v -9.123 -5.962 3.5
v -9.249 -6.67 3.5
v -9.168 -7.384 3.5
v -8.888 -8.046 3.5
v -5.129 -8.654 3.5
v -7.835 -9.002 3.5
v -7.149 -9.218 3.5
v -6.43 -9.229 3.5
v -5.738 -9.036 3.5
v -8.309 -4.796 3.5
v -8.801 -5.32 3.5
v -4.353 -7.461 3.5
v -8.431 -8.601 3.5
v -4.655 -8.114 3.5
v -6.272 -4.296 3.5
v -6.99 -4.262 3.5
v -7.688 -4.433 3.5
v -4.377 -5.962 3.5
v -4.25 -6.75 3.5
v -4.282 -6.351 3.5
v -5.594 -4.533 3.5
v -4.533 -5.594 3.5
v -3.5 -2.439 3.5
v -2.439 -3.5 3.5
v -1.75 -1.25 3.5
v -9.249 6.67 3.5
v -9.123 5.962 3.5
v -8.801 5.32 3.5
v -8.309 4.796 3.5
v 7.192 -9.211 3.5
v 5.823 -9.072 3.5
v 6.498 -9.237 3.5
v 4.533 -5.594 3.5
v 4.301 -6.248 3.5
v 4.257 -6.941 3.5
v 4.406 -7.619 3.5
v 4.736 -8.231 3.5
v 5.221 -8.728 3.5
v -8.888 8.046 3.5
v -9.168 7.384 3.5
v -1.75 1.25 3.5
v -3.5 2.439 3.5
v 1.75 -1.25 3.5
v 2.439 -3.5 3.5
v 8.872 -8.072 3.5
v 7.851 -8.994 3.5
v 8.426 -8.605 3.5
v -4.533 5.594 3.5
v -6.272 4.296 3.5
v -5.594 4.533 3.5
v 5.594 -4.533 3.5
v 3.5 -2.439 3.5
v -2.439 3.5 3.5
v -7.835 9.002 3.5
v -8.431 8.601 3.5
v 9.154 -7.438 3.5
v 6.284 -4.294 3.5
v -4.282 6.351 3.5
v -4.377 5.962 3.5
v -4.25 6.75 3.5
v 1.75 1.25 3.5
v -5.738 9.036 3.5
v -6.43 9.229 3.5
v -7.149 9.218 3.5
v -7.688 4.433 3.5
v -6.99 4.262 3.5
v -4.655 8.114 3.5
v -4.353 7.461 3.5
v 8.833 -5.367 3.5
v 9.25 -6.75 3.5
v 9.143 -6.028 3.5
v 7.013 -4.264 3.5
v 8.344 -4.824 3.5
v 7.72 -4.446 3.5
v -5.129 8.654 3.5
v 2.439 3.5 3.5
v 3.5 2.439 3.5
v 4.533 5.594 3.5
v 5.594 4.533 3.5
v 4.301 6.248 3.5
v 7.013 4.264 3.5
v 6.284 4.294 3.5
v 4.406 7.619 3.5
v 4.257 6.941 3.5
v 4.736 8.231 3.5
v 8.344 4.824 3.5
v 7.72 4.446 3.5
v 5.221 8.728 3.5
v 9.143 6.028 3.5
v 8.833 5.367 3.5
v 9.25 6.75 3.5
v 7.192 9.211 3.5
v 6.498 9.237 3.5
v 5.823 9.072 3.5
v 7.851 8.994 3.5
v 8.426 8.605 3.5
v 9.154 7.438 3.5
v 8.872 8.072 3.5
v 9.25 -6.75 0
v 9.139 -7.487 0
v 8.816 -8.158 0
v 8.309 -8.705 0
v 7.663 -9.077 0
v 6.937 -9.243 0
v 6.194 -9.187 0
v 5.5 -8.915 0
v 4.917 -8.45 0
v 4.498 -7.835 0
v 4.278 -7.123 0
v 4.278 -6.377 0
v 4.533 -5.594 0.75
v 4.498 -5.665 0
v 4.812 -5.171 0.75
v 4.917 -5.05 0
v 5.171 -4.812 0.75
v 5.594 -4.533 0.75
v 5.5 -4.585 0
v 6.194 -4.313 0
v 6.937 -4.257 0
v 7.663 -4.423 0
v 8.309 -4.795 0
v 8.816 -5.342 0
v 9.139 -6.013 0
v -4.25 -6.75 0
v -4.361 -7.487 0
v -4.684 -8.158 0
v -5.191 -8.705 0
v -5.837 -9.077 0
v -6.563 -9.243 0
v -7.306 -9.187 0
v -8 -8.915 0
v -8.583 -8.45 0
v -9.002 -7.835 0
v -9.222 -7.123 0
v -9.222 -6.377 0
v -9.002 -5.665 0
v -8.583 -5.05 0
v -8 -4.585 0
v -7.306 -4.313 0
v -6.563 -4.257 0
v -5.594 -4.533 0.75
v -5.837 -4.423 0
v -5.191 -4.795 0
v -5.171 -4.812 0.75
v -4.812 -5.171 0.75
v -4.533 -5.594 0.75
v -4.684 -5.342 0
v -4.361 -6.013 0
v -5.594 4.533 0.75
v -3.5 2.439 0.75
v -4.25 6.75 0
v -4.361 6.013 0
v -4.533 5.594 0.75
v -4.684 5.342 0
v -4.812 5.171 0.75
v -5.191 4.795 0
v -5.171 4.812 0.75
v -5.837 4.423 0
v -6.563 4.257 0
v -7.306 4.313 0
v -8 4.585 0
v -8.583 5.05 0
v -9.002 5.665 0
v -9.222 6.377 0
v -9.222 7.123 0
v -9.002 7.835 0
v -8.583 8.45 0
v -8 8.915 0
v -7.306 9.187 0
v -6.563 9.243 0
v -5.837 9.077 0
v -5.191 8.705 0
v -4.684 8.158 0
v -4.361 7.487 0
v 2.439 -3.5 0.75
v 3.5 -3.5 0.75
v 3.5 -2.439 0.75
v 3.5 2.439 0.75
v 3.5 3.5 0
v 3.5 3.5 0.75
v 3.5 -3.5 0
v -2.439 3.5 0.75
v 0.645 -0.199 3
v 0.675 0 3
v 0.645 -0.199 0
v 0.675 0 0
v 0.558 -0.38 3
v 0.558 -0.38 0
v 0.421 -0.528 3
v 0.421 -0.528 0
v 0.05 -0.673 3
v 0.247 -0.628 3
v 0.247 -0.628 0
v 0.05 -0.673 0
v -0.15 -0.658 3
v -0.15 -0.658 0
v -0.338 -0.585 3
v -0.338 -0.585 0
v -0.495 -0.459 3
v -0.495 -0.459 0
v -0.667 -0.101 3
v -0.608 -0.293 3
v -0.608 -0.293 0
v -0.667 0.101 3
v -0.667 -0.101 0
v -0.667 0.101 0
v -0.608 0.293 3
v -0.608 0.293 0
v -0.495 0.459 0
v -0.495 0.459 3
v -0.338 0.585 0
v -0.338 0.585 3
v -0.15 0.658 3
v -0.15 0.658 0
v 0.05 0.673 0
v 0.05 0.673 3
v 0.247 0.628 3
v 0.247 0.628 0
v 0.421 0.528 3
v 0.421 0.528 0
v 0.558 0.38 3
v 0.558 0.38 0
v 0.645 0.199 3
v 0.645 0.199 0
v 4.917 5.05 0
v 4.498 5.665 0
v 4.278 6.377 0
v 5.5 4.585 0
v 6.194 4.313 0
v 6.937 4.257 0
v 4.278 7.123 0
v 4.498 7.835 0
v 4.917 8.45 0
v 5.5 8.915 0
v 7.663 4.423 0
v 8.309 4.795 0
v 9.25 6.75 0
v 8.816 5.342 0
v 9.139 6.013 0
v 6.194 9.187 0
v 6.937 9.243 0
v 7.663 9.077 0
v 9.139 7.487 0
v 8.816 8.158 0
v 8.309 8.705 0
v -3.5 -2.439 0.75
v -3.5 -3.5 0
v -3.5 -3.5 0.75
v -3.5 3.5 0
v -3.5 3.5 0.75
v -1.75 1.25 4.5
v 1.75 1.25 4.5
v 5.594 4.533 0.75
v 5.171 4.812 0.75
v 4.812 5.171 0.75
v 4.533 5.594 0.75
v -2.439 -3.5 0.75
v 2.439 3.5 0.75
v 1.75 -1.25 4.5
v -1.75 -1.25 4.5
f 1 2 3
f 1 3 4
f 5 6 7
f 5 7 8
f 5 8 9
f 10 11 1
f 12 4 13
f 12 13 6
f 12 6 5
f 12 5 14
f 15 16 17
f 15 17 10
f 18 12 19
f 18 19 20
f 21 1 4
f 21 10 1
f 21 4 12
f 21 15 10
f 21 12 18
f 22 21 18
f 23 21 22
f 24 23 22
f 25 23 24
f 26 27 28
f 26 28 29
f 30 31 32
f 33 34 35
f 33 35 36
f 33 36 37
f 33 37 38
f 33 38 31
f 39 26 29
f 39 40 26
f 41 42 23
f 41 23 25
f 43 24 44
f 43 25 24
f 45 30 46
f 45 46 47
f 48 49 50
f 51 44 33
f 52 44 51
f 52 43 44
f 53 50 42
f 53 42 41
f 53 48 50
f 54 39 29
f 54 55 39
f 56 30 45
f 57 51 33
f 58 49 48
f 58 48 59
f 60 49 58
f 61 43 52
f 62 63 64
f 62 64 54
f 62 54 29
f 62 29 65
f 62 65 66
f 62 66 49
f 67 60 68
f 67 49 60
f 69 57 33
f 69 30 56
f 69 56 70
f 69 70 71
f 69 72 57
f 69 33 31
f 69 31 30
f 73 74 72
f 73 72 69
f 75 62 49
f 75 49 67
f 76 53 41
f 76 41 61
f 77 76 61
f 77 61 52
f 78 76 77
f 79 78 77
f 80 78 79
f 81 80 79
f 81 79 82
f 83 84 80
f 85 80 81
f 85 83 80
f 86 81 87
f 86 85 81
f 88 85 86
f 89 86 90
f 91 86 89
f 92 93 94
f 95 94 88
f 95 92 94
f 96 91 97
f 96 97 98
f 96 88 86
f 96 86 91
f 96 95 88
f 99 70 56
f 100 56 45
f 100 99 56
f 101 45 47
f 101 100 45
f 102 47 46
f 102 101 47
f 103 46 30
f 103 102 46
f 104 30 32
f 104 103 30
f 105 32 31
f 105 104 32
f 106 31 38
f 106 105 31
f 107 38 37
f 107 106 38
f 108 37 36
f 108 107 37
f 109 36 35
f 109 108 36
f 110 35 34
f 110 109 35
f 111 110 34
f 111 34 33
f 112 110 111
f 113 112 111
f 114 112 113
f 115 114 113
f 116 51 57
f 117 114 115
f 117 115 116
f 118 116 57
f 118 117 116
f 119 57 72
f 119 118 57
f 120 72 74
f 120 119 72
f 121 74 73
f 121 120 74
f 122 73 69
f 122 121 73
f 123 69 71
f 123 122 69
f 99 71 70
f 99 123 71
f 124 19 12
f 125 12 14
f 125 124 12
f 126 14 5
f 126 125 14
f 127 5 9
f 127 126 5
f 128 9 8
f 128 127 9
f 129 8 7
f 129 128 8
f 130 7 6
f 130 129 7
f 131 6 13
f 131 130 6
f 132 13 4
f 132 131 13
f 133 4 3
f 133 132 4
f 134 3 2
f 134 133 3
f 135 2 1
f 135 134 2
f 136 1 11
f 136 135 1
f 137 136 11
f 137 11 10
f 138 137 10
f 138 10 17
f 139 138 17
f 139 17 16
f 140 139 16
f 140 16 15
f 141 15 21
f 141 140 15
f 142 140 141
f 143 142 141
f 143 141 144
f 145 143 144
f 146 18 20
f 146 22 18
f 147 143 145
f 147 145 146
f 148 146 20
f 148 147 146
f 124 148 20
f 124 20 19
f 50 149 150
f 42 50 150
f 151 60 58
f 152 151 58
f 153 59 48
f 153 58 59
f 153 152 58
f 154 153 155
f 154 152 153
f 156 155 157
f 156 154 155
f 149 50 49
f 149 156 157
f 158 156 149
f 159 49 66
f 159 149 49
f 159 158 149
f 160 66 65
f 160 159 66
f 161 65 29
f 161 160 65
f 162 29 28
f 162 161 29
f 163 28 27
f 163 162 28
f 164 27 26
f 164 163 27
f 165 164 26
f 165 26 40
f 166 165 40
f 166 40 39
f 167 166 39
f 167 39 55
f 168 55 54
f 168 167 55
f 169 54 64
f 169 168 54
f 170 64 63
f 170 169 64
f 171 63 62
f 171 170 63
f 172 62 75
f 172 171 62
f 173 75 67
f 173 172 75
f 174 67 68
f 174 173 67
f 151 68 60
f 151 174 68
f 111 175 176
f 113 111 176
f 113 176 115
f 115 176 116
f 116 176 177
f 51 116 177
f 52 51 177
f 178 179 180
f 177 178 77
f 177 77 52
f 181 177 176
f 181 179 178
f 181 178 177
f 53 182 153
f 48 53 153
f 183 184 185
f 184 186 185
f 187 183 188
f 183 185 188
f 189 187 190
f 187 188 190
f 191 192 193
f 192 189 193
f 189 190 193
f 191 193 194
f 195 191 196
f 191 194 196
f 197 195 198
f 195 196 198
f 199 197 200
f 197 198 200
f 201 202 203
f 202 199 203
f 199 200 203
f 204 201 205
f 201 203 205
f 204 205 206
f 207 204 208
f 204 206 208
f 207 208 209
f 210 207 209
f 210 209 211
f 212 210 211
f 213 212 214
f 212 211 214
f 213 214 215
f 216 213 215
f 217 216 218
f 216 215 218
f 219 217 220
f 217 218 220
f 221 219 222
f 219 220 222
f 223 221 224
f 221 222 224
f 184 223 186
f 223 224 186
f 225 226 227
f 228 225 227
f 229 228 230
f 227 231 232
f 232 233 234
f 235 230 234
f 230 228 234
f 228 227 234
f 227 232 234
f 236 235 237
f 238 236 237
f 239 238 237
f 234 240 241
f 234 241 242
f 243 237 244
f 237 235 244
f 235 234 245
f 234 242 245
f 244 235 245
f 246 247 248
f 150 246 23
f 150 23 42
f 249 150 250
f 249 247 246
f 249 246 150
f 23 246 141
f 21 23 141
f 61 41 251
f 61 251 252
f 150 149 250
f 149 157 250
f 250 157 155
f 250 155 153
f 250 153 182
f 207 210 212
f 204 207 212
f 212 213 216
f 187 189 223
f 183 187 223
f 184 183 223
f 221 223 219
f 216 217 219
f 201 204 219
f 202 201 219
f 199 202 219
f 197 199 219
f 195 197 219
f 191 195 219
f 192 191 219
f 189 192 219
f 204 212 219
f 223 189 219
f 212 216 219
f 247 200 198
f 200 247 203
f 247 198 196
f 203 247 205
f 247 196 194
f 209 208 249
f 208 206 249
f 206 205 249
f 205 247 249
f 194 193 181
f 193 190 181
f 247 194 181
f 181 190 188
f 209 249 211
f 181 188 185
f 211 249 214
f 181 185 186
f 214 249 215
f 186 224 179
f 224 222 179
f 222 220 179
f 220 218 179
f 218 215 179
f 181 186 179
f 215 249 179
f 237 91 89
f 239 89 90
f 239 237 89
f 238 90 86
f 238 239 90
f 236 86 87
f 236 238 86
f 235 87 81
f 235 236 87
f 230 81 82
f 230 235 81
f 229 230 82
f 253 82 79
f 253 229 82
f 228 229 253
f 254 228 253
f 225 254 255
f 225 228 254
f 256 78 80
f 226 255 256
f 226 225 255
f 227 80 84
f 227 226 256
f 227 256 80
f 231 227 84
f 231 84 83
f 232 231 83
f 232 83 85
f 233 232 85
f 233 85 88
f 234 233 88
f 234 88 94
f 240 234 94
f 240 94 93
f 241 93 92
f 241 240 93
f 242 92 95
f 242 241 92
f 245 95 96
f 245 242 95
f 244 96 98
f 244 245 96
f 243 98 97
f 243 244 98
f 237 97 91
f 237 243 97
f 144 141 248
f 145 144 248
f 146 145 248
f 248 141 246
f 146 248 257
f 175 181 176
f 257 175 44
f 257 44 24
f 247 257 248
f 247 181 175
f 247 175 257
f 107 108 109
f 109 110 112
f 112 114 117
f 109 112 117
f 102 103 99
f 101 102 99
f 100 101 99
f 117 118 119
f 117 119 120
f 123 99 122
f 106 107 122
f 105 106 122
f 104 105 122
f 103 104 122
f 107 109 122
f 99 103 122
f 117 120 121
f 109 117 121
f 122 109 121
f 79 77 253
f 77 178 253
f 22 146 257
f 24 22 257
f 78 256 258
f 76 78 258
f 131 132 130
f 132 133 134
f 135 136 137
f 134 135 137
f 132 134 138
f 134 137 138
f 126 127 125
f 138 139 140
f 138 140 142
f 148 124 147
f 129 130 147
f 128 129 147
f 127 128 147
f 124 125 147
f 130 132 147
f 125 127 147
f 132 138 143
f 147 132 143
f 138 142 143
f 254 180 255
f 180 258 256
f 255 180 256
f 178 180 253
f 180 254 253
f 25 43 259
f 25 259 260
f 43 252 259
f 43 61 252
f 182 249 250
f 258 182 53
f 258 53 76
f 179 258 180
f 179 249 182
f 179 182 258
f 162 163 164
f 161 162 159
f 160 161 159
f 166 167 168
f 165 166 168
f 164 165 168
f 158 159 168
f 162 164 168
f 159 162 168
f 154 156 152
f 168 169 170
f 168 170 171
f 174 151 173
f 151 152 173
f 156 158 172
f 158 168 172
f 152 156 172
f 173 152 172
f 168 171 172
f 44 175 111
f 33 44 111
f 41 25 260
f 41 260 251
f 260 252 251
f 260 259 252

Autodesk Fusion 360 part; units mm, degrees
sketch "Sketch1" plane through (0, 0, 0) normal (0, 0, 1) x (1, 0, 0)
  line L0 (-3, 10.6) -> (3, 10.6) construction
  line L1 (3, 10.6) -> (3, 4.6) construction
  line L2 (3, 4.6) -> (-3, 4.6) construction
  line L3 (-3, 4.6) -> (-3, 10.6) construction
  line L4 (0, -7.6) -> (0, 7.6) construction
  line L5 (0, 0) -> (-6, 0) construction
  line L6 (-3, 10.6) -> (3, 4.6) construction
  line L7 (3, 10.6) -> (-3, 4.6) construction
  line L8 (-3, -4.6) -> (3, -4.6) construction
  line L9 (3, -4.6) -> (3, -10.6) construction
  line L10 (3, -10.6) -> (-3, -10.6) construction
  line L11 (-3, -10.6) -> (-3, -4.6) construction
  line L12 (4.6, 3) -> (10.6, 3) construction
  line L13 (10.6, 3) -> (10.6, -3) construction
  line L14 (10.6, -3) -> (4.6, -3) construction
  line L15 (4.6, -3) -> (4.6, 3) construction
  line L16 (-10.6, 3) -> (-4.6, 3) construction
  line L17 (-4.6, 3) -> (-4.6, -3) construction
  line L18 (-4.6, -3) -> (-10.6, -3) construction
  line L19 (-10.6, -3) -> (-10.6, 3) construction
  line L20 (-7.6, 0) -> (7.6, 0) construction
  line L21 (-10.6, 3) -> (-4.6, -3) construction
  line L22 (-4.6, 3) -> (-10.6, -3) construction
  line L23 (-3, -10.6) -> (3, -4.6) construction
  line L24 (-3, -4.6) -> (3, -10.6) construction
  line L25 (4.6, 3) -> (10.6, -3) construction
  line L26 (10.6, 3) -> (4.6, -3) construction
  dimension "d1" = 6
  dimension "d3" = 15.2
sketch "Sketch5" plane through (0, 0, 0) normal (0, 0, 1) x (1, 0, 0)
  line L0 (-3.5, 3.5) -> (3.5, 3.5)
  line L1 (3.5, 3.5) -> (3.5, -3.5)
  line L2 (3.5, -3.5) -> (-3.5, -3.5)
  line L3 (-3.5, -3.5) -> (-3.5, 3.5)
  line L4 (-3.5, 3.5) -> (3.5, -3.5) construction
  line L5 (3.5, 3.5) -> (-3.5, -3.5) construction
  dimension "d11" = 7
extrude "Extrude4" add sketch "Sketch5" along normal blind 3.5 makes body 1
sketch "Sketch6" plane through (0, 0, 0) normal (0, 0, 1) x (1, 0, 0)
  circle A0 centre (-6.75, 6.75) radius 2.5
  circle A1 centre (6.75, 6.75) radius 2.5
  circle A2 centre (6.75, -6.75) radius 2.5
  circle A3 centre (-6.75, -6.75) radius 2.5
  line L0 (-6.75, 6.75) -> (6.75, 6.75) construction
  line L1 (6.75, 6.75) -> (6.75, -6.75) construction
  line L2 (6.75, -6.75) -> (-6.75, -6.75) construction
  line L3 (-6.75, -6.75) -> (-6.75, 6.75) construction
  line L4 (6.75, 6.75) -> (-6.75, -6.75) construction
  line L5 (-6.75, 6.75) -> (6.75, -6.75) construction
  point P0 (-7.6, 0)
  point P1 (7.6, 0)
  point P2 (0, 7.6)
  point P3 (0, -7.6)
  dimension "d14" = 5
  dimension "d15" = 13.5
extrude "Extrude5" add sketch "Sketch6" along normal blind 3.5 separate body makes body 2 at (9.2376, 6.5011, 2.3333) makes body 3 at (9.2376, -6.9989, 2.3333) makes body 4 at (-4.2624, 6.5011, 2.3333) makes body 5 at (-4.2624, -6.9989, 2.3333)
ref_plane "WorkPlane1" through (0, 0, 0.75) normal (0, 0, 1) x (1, 0, 0)
sketch "Sketch7" plane through (0, 0, 0.75) normal (0, 0, 1) x (1, 0, 0)
  line L0 (-5.594, 4.5333) -> (4.5333, -5.594)
  line L1 (4.5333, -5.594) -> (5.594, -4.5333)
  line L2 (5.594, -4.5333) -> (-4.5333, 5.594)
  line L3 (-4.5333, 5.594) -> (-5.594, 4.5333)
  line L4 (5.594, 4.5333) -> (4.5333, 5.594)
  line L5 (4.5333, 5.594) -> (-5.594, -4.5333)
  line L6 (-5.594, -4.5333) -> (-4.5333, -5.594)
  line L7 (-4.5333, -5.594) -> (5.594, 4.5333)
  line L8 (-7.6, 0) -> (7.6, 0)
  line L9 (-1.0607, 0) -> (1.0607, 0) construction
  line L10 (0, -7.6) -> (0, 7.6) construction
  circle A0 centre (6.75, 6.75) radius 2.5 construction
  circle A1 centre (-6.75, 6.75) radius 2.5 construction
  circle A2 centre (-6.75, -6.75) radius 2.5 construction
  circle A3 centre (6.75, -6.75) radius 2.5 construction
  dimension "d18" = 45
  dimension "d19" = 1.5
extrude "Extrude6" add sketch "Sketch7" along normal up to surface (2.75 mm away) contours L0 L2 L3 L5 | L0 L5 L6 L7 | L0 L1 L2 L7 | L2 L4 L5 L7 bodies 1 2 3 4 5
sketch "Sketch9" plane through (0, 0, 0) normal (0, 0, 1) x (1, 0, 0)
  circle A0 centre (0, 0) radius 0.675
  dimension "d23" = 1.35
extrude "Extrude7" cut sketch "Sketch9" along normal blind 3 bodies 1
sketch "Sketch10" plane through (0, 0, 3.5) normal (0, 0, 1) x (-1, 0, 0)
  arc A0 (4.5333, -5.594) -> (5.594, -4.5333) centre (6.75, -6.75) ccw
  line L0 (5.594, -4.5333) -> (3.5, -2.4393)
  line L1 (3.5, -2.4393) -> (3.5, 2.4393)
  line L2 (3.5, 2.4393) -> (5.594, 4.5333)
  arc A1 (5.594, 4.5333) -> (4.5333, 5.594) centre (6.75, 6.75) ccw
  line L3 (4.5333, 5.594) -> (2.4393, 3.5)
  line L4 (2.4393, 3.5) -> (-2.4393, 3.5)
  line L5 (-2.4393, 3.5) -> (-4.5333, 5.594)
  arc A2 (-4.5333, 5.594) -> (-5.594, 4.5333) centre (-6.75, 6.75) ccw
  line L6 (-5.594, 4.5333) -> (-3.5, 2.4393)
  line L7 (-3.5, 2.4393) -> (-3.5, -2.4393)
  line L8 (-3.5, -2.4393) -> (-5.594, -4.5333)
  arc A3 (-5.594, -4.5333) -> (-4.5333, -5.594) centre (-6.75, -6.75) ccw
  line L9 (-4.5333, -5.594) -> (-2.4393, -3.5)
  line L10 (-2.4393, -3.5) -> (2.4393, -3.5)
  line L11 (2.4393, -3.5) -> (4.5333, -5.594)
  line L12 (1.75, -1.25) -> (-1.75, -1.25)
  line L13 (-1.75, -1.25) -> (-1.75, 1.25)
  line L14 (-1.75, 1.25) -> (1.75, 1.25)
  line L15 (1.75, 1.25) -> (1.75, -1.25)
  line L16 (1.75, -1.25) -> (-1.75, 1.25) construction
  line L17 (-1.75, -1.25) -> (1.75, 1.25) construction
  dimension "d26" = 3.5
  dimension "d27" = 2.5
extrude "Extrude8" add sketch "Sketch10" along normal blind 1 contours L12 L13 L14 L15 bodies 1
